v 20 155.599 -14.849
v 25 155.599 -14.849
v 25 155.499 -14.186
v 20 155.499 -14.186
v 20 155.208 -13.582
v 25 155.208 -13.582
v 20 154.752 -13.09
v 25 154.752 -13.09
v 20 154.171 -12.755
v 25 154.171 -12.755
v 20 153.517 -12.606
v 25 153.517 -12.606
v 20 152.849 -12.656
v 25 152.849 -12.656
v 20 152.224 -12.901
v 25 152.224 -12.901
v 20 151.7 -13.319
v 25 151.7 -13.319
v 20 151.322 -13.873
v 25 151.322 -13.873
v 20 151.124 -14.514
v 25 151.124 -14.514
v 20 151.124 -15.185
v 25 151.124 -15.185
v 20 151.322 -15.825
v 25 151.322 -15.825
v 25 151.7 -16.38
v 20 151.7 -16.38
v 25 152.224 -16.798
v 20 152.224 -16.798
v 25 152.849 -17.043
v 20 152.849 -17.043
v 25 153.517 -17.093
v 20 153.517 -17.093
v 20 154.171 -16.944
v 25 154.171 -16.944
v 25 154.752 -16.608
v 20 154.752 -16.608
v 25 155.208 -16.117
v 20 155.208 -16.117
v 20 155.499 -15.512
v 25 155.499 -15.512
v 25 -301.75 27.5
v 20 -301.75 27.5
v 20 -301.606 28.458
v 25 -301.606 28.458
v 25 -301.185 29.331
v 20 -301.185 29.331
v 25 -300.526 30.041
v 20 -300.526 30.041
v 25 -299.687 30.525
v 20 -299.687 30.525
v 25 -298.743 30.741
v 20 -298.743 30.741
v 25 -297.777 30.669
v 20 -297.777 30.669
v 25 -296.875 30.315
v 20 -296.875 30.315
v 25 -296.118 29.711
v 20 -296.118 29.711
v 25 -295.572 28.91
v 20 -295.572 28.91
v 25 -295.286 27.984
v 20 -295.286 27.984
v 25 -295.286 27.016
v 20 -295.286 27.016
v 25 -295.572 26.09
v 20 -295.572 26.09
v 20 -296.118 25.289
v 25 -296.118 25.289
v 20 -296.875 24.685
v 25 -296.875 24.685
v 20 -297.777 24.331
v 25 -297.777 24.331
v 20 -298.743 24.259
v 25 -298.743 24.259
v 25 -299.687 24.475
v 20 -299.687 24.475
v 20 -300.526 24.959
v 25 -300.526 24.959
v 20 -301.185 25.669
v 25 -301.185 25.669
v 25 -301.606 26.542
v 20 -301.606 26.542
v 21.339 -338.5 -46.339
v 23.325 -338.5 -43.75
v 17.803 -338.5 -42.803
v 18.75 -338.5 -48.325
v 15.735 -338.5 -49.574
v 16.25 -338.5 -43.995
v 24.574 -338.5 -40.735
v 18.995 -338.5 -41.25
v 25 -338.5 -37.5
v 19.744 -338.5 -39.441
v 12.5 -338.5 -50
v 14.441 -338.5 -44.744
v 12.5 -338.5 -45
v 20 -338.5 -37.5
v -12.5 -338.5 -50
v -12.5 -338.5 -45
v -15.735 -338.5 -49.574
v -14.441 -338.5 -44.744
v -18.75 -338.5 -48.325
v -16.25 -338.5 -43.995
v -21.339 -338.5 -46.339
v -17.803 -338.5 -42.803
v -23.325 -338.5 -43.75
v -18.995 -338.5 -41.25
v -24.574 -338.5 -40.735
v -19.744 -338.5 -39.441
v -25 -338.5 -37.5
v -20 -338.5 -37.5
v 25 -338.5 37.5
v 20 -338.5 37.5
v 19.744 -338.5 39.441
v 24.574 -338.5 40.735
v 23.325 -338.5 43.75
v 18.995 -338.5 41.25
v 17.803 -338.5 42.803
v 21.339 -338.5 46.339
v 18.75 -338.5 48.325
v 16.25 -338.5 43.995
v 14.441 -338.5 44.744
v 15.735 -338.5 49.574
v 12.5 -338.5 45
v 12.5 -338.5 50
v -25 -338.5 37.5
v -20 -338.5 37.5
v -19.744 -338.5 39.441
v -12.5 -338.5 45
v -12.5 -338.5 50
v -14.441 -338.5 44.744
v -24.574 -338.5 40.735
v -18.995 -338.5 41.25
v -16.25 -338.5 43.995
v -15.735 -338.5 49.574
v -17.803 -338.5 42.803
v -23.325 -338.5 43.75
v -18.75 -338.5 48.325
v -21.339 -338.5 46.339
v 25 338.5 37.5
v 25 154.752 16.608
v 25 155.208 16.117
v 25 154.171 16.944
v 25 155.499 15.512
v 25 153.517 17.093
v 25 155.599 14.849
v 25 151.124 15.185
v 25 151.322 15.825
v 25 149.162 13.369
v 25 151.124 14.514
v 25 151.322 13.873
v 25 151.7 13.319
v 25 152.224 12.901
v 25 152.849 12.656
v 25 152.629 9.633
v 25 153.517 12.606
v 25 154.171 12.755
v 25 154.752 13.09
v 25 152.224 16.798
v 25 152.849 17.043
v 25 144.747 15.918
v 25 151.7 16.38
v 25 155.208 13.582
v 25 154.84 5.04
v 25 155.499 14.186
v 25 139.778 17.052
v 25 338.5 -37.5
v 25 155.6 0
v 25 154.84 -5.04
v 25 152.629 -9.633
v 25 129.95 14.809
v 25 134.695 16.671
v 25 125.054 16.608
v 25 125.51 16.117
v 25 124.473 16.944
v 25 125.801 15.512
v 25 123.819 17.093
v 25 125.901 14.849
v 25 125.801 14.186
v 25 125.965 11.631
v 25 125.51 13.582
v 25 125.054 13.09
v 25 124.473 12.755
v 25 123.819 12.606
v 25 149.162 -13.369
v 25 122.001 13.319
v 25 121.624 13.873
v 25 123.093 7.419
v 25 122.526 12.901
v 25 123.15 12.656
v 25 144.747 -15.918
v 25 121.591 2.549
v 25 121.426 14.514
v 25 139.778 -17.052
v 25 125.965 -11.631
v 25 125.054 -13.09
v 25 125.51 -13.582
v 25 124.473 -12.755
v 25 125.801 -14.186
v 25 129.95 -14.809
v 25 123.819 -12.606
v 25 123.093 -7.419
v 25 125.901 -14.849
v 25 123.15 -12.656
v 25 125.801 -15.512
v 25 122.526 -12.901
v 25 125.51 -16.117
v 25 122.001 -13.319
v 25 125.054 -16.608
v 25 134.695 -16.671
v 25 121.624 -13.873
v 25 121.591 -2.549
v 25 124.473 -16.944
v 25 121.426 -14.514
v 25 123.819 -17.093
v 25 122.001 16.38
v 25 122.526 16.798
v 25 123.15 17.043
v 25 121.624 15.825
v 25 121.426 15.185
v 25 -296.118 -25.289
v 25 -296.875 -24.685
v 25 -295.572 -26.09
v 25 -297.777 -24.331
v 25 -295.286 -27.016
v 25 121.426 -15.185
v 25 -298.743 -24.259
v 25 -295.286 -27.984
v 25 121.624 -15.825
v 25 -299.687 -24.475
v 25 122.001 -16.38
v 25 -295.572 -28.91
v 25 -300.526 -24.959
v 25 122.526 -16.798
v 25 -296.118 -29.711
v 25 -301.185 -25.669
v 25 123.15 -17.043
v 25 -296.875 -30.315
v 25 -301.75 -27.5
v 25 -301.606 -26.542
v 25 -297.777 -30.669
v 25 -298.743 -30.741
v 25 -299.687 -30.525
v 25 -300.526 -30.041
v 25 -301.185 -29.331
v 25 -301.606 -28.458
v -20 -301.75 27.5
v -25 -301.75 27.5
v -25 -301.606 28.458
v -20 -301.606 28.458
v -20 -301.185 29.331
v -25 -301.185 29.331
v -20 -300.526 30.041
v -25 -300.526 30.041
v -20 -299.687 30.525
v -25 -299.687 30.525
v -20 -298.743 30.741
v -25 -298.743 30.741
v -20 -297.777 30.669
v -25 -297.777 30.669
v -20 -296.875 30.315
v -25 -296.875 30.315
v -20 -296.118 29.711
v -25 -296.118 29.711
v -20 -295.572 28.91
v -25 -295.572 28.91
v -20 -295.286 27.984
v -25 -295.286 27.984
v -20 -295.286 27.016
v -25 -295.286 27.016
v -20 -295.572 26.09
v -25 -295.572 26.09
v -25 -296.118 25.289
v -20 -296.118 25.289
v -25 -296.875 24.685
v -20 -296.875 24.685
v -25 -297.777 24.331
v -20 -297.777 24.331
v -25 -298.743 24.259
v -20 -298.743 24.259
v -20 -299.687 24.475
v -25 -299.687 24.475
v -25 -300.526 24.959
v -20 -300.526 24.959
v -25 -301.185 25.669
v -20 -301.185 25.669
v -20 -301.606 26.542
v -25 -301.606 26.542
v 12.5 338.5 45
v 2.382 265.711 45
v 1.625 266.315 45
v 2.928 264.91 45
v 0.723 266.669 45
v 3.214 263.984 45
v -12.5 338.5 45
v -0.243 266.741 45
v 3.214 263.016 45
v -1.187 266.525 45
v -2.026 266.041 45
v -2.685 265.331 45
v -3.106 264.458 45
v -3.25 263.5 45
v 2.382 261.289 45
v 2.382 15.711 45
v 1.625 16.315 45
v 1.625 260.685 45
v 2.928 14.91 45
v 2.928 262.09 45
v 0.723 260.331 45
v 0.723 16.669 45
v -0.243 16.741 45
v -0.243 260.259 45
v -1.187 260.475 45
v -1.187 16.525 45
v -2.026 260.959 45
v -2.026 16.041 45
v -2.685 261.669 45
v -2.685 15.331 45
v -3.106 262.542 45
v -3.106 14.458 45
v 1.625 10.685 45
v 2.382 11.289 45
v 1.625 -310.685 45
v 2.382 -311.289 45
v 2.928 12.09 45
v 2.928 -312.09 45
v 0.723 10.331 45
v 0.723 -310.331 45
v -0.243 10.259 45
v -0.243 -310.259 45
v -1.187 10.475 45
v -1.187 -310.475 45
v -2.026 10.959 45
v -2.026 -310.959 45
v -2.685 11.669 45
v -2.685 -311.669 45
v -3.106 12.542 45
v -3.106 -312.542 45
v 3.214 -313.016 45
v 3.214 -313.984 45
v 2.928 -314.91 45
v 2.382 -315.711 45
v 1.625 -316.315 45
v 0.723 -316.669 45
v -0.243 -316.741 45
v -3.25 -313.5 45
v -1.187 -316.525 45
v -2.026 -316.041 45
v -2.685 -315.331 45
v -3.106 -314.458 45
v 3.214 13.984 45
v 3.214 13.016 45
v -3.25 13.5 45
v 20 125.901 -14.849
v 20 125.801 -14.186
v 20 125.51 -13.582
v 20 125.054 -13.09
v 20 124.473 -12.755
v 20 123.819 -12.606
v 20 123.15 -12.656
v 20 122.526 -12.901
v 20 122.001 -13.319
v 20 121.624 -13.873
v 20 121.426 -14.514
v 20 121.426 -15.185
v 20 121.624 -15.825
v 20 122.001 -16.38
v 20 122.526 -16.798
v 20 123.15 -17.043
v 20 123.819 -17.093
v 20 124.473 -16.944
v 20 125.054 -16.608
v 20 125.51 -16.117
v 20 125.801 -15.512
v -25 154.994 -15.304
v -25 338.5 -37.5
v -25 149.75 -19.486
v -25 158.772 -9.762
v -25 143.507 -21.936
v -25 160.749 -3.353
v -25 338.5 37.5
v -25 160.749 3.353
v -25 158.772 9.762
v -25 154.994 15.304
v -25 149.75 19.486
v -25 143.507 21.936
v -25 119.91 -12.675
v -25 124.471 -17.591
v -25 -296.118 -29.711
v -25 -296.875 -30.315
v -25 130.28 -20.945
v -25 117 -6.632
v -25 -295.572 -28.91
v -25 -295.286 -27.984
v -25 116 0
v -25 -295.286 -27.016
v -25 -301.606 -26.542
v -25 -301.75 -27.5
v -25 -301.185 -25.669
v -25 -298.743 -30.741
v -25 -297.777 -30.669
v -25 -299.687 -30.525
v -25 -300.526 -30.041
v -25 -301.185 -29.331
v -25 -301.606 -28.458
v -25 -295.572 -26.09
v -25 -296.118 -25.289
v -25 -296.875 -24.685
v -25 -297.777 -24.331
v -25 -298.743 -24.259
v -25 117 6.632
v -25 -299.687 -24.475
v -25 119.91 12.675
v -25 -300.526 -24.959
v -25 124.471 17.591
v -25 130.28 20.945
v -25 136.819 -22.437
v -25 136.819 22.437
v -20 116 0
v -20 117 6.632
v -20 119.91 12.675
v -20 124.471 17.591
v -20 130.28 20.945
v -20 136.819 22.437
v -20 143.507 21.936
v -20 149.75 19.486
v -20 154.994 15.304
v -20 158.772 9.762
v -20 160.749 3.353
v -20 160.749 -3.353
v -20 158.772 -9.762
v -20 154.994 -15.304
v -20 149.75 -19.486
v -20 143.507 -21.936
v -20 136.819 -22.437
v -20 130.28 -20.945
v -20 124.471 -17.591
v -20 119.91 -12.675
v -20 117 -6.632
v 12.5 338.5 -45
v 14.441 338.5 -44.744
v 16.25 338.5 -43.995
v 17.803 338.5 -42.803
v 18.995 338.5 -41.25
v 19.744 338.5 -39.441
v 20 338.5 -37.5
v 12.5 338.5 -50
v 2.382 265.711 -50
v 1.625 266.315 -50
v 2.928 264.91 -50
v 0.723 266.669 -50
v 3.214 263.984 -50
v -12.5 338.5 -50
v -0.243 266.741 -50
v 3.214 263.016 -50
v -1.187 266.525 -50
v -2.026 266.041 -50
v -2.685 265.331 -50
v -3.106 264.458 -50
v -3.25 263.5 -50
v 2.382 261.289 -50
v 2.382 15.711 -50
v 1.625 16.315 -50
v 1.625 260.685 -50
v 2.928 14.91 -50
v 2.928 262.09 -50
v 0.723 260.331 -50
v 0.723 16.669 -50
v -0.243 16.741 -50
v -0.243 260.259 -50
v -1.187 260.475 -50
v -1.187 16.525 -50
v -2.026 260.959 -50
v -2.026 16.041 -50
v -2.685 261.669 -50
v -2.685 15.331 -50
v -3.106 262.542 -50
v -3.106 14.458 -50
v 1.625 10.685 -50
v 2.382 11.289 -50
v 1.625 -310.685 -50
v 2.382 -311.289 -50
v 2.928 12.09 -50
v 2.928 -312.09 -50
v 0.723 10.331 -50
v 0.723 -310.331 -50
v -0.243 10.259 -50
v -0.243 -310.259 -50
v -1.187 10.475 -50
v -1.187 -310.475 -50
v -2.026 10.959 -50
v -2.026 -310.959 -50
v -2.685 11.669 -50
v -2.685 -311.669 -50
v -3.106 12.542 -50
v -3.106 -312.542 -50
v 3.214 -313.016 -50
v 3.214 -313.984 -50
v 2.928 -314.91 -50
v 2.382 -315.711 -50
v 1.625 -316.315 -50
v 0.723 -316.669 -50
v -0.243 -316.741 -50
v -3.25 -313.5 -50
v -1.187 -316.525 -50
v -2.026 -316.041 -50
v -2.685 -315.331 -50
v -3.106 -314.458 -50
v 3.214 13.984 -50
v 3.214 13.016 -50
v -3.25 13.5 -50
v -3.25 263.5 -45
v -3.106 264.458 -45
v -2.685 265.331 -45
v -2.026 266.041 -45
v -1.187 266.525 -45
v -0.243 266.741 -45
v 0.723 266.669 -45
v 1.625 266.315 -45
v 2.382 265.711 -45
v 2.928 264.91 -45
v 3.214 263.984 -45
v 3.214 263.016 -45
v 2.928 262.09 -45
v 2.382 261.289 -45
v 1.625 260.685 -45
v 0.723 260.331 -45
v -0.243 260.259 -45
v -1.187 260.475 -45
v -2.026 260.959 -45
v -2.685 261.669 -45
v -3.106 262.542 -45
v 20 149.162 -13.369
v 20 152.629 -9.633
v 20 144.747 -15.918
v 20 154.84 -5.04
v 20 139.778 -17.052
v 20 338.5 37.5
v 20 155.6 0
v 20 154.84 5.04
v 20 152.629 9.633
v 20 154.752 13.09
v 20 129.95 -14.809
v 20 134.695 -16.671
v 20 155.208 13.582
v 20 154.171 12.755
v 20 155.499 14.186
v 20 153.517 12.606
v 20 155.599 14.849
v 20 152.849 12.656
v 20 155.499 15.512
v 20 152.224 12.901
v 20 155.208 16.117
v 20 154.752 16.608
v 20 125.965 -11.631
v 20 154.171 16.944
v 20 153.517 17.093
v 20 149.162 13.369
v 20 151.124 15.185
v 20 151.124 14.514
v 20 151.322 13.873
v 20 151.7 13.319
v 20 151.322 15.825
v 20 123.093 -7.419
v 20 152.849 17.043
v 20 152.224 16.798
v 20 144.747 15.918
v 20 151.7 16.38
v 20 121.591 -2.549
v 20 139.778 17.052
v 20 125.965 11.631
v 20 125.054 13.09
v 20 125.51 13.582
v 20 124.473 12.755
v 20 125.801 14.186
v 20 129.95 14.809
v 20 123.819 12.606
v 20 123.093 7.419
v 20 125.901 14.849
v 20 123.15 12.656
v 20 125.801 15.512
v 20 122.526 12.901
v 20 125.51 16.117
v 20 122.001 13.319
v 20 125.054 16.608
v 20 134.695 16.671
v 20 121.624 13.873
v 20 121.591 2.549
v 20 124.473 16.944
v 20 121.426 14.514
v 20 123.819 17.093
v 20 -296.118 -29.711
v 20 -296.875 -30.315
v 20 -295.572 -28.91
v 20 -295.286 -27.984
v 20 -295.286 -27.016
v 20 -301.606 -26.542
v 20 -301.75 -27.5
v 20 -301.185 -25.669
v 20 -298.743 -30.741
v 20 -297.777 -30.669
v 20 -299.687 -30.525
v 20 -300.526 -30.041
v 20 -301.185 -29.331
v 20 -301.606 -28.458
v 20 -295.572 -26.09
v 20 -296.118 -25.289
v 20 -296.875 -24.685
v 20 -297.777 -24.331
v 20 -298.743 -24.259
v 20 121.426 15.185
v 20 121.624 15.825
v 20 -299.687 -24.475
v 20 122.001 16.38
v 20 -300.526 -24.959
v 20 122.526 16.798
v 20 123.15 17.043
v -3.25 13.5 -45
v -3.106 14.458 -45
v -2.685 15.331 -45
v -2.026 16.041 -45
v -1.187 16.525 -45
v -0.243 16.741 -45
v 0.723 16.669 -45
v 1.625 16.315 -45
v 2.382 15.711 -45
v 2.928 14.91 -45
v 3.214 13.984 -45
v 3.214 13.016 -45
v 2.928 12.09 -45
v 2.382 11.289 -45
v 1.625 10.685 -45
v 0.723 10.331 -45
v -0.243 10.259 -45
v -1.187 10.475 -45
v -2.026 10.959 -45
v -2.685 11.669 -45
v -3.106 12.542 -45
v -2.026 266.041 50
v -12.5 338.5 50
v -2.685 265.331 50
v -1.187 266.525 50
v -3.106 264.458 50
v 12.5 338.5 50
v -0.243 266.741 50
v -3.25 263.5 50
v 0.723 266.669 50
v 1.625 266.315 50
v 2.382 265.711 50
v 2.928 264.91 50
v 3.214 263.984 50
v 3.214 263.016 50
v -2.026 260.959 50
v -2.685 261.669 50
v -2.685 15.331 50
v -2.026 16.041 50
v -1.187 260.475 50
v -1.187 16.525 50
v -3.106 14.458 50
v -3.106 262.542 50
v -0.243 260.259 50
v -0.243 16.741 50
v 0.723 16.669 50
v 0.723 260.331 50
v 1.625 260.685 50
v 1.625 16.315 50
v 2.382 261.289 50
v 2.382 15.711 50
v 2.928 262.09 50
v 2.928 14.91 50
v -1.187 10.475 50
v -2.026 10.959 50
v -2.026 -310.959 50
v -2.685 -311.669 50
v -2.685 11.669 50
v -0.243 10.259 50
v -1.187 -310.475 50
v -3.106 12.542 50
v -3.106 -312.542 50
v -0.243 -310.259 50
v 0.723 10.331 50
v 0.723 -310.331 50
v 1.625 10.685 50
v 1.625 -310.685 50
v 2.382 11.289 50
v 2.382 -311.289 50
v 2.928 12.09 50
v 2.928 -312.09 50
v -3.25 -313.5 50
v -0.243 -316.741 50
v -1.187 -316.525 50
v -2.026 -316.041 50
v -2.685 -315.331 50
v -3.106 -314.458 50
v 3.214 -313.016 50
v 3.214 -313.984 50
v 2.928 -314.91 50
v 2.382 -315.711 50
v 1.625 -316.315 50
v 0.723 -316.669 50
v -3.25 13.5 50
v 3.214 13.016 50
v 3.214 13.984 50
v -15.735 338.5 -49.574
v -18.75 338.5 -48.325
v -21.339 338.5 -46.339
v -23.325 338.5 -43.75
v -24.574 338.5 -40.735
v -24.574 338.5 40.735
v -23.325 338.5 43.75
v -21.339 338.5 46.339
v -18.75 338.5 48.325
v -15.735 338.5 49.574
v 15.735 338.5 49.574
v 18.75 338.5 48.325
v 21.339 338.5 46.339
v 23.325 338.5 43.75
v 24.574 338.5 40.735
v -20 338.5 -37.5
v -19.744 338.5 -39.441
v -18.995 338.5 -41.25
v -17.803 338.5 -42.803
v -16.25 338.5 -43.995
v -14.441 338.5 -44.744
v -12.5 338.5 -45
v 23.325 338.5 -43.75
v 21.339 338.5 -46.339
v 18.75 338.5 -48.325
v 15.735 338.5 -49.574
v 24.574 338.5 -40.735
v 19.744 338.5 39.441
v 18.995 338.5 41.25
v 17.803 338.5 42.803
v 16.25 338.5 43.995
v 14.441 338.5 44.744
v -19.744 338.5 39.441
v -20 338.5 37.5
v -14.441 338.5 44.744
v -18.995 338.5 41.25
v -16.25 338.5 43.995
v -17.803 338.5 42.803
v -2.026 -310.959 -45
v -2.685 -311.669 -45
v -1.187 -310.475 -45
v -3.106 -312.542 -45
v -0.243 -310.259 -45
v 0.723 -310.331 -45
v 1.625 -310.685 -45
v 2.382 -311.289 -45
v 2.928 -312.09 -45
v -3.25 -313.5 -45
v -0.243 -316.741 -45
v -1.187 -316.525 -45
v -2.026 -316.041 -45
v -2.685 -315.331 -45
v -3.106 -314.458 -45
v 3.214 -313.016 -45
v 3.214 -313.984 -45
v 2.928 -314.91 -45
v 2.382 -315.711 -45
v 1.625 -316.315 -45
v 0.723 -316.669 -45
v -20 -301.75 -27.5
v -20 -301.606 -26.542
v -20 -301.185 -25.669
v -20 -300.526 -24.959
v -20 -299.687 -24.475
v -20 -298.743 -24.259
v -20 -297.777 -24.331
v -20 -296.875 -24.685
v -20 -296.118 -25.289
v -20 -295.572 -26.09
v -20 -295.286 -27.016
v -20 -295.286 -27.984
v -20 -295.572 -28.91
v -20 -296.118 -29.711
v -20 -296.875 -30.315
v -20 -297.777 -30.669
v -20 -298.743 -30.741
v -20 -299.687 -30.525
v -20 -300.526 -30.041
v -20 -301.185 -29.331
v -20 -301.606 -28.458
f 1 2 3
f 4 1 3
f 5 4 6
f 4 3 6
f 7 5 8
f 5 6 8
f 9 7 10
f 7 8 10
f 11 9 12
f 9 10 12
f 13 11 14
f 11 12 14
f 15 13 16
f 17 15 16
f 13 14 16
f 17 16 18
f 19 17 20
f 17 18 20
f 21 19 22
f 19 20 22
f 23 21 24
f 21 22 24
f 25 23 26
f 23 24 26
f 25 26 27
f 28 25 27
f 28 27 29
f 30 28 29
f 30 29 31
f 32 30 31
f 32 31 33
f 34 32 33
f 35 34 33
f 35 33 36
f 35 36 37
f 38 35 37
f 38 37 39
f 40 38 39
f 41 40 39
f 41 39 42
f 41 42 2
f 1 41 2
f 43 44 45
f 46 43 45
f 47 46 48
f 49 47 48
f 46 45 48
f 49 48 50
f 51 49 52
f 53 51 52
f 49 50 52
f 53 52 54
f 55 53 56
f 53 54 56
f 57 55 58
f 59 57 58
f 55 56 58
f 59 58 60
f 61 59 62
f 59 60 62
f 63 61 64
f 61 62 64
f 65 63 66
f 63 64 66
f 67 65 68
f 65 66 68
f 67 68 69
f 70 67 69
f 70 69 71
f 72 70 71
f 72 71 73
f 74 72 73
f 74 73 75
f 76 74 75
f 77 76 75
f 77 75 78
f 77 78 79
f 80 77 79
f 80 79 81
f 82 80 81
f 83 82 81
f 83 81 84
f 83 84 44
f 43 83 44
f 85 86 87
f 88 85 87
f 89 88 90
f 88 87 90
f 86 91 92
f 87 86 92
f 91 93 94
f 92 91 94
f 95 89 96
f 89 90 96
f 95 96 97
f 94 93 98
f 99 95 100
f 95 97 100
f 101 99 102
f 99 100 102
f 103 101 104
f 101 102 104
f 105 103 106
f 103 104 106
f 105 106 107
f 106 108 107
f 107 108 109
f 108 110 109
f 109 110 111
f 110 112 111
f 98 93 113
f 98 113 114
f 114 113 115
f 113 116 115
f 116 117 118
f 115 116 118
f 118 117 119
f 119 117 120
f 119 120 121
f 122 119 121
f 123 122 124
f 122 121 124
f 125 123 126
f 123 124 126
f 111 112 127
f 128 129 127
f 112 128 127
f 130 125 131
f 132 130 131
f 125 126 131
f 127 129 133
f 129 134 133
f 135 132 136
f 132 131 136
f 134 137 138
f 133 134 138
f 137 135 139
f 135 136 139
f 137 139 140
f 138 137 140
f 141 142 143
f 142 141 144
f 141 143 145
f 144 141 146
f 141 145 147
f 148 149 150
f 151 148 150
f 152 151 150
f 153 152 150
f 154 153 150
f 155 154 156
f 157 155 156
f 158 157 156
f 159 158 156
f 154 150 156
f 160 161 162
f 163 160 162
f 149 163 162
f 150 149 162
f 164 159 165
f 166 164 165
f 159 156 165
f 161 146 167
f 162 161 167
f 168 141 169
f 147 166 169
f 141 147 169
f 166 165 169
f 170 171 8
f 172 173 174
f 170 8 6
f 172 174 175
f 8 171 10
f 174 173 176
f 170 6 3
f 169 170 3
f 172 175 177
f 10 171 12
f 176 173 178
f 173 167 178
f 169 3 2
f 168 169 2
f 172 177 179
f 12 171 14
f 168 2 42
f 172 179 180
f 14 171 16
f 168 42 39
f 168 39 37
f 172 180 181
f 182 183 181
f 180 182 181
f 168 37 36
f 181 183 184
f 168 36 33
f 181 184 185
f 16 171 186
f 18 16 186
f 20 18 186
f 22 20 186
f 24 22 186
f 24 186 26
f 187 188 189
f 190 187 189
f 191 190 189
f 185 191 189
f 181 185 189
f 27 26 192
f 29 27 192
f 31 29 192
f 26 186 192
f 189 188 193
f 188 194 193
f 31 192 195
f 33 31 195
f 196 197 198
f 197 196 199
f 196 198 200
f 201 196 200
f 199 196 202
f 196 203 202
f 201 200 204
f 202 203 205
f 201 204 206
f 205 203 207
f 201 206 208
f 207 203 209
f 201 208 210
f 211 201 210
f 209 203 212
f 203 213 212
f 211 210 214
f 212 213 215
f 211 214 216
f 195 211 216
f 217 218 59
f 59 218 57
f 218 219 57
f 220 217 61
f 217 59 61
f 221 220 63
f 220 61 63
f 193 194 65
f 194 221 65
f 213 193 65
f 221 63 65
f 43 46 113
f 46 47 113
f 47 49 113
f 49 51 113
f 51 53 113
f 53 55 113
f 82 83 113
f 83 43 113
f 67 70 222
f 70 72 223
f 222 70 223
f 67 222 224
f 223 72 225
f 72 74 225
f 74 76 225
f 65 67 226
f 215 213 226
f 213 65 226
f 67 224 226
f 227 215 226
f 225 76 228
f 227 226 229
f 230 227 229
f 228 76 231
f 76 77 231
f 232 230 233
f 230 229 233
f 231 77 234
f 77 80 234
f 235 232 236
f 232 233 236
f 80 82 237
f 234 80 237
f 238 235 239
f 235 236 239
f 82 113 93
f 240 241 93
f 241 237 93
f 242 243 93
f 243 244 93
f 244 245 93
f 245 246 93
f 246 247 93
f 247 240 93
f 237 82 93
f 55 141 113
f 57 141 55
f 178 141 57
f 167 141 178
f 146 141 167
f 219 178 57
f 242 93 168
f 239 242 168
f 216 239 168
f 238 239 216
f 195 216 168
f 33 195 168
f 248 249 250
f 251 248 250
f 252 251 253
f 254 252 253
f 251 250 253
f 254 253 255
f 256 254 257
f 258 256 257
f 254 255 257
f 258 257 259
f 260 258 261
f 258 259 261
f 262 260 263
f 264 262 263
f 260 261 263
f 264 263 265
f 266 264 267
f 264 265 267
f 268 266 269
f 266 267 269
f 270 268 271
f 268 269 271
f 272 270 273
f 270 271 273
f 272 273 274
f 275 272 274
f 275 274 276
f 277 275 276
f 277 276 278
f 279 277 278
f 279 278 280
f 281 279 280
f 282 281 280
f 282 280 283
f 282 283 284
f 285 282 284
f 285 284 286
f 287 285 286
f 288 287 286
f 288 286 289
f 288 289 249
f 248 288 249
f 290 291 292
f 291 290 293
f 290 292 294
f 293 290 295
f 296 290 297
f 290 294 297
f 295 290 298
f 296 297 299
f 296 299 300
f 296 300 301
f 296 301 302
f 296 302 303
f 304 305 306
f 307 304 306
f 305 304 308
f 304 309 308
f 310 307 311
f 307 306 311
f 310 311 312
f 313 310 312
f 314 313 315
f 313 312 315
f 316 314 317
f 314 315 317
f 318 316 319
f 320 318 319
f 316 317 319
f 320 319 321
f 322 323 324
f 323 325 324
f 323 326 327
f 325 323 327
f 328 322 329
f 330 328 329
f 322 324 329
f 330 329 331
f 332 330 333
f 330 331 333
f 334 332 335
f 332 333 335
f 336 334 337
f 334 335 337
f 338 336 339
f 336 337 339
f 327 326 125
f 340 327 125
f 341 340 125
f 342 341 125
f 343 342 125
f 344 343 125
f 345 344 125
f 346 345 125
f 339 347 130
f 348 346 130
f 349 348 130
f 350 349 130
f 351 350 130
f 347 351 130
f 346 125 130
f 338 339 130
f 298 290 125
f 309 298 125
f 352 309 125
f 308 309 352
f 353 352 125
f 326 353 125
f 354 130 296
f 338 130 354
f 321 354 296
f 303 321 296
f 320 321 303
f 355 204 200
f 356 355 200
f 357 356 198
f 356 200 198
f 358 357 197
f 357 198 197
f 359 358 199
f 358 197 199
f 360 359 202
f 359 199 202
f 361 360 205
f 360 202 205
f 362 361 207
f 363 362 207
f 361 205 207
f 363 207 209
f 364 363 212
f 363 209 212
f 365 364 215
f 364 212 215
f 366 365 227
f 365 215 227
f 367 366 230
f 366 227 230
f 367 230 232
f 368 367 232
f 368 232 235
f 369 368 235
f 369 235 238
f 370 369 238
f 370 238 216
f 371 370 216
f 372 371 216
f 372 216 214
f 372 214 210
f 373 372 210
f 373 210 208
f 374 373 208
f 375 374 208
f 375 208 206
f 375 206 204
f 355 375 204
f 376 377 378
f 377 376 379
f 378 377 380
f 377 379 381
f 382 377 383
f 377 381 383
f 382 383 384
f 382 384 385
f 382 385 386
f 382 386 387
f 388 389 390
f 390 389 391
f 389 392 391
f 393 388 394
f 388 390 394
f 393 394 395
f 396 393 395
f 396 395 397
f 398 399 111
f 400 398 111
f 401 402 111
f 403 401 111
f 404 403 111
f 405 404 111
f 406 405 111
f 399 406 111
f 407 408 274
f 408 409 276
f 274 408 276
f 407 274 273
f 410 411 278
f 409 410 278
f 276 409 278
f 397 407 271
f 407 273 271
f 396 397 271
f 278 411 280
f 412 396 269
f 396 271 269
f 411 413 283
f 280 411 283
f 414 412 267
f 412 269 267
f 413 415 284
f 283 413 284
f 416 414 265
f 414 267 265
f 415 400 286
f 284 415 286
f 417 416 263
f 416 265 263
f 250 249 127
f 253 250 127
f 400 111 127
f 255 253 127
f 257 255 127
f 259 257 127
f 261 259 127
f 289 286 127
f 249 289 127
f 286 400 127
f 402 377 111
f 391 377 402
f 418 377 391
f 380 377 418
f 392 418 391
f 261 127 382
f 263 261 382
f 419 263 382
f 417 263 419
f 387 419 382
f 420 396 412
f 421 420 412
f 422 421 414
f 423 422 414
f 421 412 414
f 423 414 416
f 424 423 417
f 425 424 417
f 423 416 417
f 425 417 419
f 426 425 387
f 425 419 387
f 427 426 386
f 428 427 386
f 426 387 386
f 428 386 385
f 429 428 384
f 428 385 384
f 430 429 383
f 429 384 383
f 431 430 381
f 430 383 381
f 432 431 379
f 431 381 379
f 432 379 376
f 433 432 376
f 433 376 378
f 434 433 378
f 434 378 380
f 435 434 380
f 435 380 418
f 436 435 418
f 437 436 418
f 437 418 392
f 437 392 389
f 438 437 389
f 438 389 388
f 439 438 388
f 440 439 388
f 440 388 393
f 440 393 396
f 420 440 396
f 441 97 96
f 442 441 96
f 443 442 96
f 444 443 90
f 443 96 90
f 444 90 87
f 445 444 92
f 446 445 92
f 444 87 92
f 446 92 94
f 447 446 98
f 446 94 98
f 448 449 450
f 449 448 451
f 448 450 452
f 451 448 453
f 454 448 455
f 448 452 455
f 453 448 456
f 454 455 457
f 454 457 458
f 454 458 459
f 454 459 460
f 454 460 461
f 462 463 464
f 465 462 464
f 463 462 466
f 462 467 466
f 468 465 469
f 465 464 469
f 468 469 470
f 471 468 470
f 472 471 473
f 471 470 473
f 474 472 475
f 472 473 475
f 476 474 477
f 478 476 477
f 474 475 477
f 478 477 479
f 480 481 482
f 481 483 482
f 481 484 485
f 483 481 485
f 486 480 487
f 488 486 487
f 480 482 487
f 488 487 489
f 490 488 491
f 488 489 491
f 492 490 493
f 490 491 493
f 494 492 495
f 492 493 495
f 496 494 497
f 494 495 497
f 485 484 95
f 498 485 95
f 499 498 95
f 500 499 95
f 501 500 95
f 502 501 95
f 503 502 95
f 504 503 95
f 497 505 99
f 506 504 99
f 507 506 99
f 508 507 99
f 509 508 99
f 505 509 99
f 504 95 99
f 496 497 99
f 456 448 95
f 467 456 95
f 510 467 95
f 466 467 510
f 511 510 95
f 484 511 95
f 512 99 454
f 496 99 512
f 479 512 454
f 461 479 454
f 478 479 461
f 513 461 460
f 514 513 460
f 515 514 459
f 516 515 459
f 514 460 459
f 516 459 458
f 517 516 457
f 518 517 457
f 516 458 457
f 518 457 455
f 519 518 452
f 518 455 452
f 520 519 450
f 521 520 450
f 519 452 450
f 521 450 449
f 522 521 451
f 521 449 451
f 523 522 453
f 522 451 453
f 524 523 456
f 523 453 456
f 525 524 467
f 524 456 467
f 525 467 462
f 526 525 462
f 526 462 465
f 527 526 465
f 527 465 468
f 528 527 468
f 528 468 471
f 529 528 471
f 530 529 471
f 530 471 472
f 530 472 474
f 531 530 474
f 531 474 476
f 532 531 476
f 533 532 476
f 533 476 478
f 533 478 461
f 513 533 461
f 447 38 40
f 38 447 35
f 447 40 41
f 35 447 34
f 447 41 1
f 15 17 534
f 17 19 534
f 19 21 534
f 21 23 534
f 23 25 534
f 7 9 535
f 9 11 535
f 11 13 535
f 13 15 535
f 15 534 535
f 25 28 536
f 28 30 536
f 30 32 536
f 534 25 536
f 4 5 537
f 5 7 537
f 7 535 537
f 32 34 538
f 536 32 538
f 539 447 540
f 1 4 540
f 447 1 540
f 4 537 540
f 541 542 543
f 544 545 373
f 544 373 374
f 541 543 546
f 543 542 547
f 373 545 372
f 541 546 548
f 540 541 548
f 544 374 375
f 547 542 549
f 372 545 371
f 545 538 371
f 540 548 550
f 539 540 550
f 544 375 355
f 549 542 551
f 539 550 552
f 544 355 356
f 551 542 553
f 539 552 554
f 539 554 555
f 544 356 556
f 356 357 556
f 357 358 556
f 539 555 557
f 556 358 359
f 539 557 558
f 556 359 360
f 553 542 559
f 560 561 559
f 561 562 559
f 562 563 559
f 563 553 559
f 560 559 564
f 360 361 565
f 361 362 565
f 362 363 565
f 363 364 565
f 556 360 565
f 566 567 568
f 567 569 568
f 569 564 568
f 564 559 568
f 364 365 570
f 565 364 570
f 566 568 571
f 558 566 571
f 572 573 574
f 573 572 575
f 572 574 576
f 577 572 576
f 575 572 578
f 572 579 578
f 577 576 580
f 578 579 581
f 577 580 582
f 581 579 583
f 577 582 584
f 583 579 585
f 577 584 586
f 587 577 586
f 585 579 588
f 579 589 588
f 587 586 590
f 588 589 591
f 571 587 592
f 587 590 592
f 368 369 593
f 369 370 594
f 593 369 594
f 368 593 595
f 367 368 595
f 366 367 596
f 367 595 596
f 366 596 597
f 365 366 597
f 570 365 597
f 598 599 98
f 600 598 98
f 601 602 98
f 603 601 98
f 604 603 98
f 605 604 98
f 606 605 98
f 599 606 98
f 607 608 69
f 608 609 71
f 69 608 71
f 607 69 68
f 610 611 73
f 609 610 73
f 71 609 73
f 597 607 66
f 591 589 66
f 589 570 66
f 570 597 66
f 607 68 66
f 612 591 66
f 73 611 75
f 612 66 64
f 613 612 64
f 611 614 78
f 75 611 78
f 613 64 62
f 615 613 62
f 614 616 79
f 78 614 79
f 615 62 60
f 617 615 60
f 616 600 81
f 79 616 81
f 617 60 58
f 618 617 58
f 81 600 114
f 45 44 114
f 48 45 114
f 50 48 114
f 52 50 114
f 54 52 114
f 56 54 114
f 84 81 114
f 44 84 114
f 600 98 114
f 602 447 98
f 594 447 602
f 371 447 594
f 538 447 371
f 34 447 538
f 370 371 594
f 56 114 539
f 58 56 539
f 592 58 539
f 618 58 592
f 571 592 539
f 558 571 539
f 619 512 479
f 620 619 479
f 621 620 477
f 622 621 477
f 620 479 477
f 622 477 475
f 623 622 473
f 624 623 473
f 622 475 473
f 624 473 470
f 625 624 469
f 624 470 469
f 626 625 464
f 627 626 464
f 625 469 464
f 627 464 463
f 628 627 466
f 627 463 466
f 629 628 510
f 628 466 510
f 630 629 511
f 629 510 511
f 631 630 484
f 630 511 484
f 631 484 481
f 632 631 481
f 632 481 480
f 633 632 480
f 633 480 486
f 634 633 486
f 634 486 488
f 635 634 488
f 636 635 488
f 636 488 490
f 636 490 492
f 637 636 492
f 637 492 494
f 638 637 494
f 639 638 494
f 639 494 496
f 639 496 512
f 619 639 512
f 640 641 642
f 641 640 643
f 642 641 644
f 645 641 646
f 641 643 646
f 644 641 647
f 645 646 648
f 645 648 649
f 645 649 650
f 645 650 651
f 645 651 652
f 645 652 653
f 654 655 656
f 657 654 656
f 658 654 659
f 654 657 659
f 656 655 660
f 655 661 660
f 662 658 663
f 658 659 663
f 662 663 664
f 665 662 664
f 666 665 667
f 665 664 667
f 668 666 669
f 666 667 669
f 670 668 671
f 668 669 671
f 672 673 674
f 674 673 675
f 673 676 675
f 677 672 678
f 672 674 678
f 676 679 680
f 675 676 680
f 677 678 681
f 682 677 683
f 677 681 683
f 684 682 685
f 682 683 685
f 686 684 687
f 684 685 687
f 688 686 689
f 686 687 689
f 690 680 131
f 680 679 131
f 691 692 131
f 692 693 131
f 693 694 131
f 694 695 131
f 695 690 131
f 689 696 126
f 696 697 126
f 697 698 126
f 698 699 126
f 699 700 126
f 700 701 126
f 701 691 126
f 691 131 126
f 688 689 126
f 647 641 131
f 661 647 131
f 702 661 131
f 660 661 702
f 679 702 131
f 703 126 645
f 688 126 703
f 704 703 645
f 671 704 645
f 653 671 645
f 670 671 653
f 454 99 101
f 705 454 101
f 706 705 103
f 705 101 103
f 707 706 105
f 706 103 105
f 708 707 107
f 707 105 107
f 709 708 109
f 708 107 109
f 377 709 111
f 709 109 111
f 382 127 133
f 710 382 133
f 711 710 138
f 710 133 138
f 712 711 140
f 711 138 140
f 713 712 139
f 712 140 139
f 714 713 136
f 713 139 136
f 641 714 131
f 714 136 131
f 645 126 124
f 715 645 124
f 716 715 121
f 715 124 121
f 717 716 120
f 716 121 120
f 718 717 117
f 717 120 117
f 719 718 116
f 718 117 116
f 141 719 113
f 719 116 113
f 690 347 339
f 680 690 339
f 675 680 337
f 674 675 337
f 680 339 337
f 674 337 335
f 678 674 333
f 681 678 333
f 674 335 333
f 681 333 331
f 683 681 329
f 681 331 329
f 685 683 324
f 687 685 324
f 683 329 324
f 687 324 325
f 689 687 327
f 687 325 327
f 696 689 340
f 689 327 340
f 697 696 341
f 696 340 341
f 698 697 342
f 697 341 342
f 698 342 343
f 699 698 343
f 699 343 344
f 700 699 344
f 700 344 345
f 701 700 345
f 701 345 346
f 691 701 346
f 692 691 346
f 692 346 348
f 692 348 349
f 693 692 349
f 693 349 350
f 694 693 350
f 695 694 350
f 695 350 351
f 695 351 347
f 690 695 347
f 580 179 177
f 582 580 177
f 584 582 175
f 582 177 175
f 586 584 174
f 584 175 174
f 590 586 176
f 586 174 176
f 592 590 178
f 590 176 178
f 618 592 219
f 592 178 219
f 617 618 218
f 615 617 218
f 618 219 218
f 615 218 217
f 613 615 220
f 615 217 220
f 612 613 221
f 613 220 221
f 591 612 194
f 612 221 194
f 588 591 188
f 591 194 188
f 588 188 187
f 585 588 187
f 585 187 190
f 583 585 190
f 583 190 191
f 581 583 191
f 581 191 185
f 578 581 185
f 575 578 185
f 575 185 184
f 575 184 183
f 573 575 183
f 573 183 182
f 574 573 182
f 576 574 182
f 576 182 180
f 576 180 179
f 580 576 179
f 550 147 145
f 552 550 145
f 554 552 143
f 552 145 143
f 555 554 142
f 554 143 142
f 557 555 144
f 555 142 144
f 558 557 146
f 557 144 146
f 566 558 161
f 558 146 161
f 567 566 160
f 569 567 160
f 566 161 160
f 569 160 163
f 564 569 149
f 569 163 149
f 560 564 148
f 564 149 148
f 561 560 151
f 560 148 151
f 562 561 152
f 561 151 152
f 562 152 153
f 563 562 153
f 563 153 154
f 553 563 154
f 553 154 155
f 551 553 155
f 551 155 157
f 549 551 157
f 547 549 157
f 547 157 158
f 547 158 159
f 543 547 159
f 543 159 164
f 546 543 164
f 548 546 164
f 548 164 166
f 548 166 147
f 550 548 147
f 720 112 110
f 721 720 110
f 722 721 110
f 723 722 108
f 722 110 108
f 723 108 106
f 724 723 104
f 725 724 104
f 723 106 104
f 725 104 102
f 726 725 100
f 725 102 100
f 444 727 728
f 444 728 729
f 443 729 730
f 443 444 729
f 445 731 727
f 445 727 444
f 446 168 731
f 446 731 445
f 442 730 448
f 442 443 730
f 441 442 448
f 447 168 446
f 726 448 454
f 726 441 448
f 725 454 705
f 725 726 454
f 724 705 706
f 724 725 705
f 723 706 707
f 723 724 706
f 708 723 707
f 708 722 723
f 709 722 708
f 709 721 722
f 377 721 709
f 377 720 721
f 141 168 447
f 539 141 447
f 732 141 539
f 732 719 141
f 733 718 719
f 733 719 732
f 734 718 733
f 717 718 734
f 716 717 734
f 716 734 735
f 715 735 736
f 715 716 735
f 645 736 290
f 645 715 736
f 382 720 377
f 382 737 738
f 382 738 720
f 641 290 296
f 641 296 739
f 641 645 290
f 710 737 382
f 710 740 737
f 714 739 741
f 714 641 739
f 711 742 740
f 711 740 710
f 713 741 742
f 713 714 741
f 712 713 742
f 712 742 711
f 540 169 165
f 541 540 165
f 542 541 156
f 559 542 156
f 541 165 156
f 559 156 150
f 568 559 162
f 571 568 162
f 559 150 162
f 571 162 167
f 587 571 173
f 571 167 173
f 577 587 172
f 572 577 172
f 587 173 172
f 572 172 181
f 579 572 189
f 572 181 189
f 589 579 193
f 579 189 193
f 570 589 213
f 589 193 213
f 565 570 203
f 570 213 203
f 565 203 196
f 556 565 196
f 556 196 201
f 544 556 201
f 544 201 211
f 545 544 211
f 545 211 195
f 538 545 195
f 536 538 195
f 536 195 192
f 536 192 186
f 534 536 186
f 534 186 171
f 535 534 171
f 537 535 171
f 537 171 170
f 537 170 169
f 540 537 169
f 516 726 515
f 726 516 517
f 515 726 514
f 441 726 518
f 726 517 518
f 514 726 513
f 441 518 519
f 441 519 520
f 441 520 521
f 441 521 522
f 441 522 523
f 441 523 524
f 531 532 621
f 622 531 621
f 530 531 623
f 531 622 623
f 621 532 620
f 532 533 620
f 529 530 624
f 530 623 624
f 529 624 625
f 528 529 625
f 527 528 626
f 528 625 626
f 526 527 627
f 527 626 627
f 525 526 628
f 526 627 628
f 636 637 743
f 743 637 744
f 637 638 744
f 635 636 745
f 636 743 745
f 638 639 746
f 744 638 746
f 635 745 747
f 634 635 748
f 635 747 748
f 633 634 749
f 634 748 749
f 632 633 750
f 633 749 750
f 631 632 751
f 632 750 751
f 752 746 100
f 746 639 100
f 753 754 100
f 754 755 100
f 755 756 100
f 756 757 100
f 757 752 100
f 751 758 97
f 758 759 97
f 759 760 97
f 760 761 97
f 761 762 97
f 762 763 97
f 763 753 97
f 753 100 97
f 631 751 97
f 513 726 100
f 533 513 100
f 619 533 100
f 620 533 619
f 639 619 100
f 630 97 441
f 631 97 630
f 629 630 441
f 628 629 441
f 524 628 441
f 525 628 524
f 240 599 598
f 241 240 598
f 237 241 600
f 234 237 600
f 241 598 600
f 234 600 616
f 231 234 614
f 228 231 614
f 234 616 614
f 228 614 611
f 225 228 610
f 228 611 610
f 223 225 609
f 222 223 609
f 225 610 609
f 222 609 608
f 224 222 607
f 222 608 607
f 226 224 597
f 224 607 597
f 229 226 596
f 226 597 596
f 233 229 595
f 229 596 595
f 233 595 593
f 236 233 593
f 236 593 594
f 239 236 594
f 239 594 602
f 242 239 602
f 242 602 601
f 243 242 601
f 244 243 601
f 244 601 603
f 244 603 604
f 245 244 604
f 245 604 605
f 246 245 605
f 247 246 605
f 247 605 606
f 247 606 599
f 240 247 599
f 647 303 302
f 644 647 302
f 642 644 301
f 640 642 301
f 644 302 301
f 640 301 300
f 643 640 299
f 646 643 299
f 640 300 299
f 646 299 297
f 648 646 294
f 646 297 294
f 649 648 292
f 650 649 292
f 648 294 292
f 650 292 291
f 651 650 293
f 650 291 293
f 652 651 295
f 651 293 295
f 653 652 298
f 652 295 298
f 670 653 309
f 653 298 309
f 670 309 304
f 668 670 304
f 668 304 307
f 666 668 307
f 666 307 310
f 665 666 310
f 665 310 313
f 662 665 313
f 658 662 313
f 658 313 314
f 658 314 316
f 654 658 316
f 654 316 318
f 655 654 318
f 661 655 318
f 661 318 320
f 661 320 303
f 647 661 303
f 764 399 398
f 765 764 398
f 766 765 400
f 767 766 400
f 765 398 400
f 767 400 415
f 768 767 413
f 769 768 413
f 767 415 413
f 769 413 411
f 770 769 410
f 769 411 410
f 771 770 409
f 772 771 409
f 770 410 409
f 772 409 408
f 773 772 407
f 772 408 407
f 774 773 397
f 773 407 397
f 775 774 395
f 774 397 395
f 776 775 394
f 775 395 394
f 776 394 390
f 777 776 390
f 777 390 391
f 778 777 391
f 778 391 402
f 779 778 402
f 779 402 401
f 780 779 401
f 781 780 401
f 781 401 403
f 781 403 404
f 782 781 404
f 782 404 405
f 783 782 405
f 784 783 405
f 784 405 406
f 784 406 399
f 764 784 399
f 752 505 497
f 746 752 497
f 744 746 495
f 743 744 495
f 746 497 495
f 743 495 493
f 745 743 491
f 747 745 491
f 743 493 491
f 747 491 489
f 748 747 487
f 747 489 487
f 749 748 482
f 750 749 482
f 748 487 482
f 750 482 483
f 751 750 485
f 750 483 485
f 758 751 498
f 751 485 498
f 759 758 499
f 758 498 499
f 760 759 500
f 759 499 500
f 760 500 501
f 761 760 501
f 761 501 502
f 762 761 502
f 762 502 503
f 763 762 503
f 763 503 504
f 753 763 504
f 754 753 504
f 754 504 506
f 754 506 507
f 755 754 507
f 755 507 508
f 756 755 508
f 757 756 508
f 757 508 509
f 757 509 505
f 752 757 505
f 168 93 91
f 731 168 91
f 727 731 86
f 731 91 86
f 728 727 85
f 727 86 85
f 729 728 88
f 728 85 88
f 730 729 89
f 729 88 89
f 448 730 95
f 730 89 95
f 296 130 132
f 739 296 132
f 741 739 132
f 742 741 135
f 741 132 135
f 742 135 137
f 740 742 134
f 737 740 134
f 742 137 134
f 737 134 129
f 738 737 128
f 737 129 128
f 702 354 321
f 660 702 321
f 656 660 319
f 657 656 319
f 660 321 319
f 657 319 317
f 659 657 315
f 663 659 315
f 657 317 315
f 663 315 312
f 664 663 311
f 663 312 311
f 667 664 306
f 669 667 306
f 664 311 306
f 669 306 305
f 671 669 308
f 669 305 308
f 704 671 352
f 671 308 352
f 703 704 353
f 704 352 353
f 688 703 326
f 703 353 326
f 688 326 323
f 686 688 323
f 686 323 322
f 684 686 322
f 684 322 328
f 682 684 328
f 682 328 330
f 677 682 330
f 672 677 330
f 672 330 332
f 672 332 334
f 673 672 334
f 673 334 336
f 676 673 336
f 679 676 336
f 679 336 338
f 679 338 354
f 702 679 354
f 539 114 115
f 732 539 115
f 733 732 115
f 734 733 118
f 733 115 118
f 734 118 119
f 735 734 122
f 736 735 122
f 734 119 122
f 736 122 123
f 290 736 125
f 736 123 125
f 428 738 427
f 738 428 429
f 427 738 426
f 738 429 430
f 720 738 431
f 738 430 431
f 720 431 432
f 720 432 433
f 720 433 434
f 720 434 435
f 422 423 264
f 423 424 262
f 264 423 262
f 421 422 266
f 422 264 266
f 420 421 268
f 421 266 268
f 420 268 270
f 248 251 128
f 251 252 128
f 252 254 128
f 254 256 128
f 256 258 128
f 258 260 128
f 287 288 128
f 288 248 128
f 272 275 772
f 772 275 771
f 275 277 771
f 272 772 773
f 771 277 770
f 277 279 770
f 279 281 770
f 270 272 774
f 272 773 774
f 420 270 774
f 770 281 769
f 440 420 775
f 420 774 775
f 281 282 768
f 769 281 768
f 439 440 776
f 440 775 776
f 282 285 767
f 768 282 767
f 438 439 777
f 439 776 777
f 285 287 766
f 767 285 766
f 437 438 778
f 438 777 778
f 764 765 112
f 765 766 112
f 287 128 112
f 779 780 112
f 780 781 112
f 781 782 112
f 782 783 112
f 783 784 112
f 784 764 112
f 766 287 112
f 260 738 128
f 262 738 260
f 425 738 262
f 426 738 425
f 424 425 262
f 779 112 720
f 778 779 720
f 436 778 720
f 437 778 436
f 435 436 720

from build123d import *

# Parameters (mm, degrees)
RHS_C350_AS_100X50X5_0_RHS_C350_1_DEPTH = 677
SKETCH18_R                              = 3.25
CUT_EXTRUDE1_DEPTH                      = 354.846364966
SKETCH19_R                              = 17.1
CUT_EXTRUDE2_DEPTH                      = 10
SKETCH20_R                              = 22.5
CUT_EXTRUDE3_DEPTH                      = 10
SKETCH12_R                              = 2.25
CUT_EXTRUDE4_DEPTH                      = 10
SKETCH21_R                              = 3.25
CUT_EXTRUDE5_DEPTH                      = 346.806665638
SKETCH22_R                              = 3.25
CUT_EXTRUDE6_DEPTH                      = 354.846364966


with BuildPart() as part:
    # Sketch11 → Rhs c350 as 100X50X5.0 RHS C350(1) (new body)
    with BuildSketch(Plane(origin=(0, -338.5, 0), x_dir=(-1, 0, 0), z_dir=(0, 1, 0))):
        with BuildLine():
            Line((-12.5, -50), (12.5, -50))
            ThreePointArc((12.5, -50), (21.338834765, -46.338834765), (25, -37.5))
            Line((25, -37.5), (25, 37.5))
            ThreePointArc((25, 37.5), (21.338834765, 46.338834765), (12.5, 50))
            Line((12.5, 50), (-12.5, 50))
            ThreePointArc((-12.5, 50), (-21.338834765, 46.338834765), (-25, 37.5))
            Line((-25, 37.5), (-25, -37.5))
            ThreePointArc((-25, -37.5), (-21.338834765, -46.338834765), (-12.5, -50))
        make_face()
        with BuildLine():
            Line((-12.5, 45), (12.5, 45))
            ThreePointArc((12.5, 45), (17.803300859, 42.803300859), (20, 37.5))
            Line((20, 37.5), (20, -37.5))
            ThreePointArc((20, -37.5), (17.803300859, -42.803300859), (12.5, -45))
            Line((12.5, -45), (-12.5, -45))
            ThreePointArc((-12.5, -45), (-17.803300859, -42.803300859), (-20, -37.5))
            Line((-20, -37.5), (-20, 37.5))
            ThreePointArc((-20, 37.5), (-17.803300859, 42.803300859), (-12.5, 45))
        make_face(mode=Mode.SUBTRACT)
    extrude(amount=RHS_C350_AS_100X50X5_0_RHS_C350_1_DEPTH)

    # Sketch18 → Cut-Extrude1 (cut, through all)
    with BuildSketch(Plane(origin=(0, 0, -50), x_dir=(-1, 0, 0), z_dir=(0, 0, -1))):
        with Locations((0, 263.5)):
            Circle(SKETCH18_R)
        with Locations((0, 13.5)):
            Circle(SKETCH18_R)
    extrude(amount=-CUT_EXTRUDE1_DEPTH, mode=Mode.SUBTRACT)

    # Sketch19 → Cut-Extrude2 (cut)
    with BuildSketch(Plane(origin=(25, 0, 0), x_dir=(0, 0, -1), z_dir=(1, 0, 0))):
        with Locations(Location((0, 138.5, 0), (0, 0, 90))):
            Circle(SKETCH19_R)
    extrude(amount=-CUT_EXTRUDE2_DEPTH, mode=Mode.SUBTRACT)

    # Sketch20 → Cut-Extrude3 (cut)
    with BuildSketch(Plane.ZY.offset(25)):
        with Locations(Location((0, 138.5, 0), (0, 0, 270))):
            Circle(SKETCH20_R)
    extrude(amount=-CUT_EXTRUDE3_DEPTH, mode=Mode.SUBTRACT)

    # Sketch12 → Cut-Extrude4 (cut)
    with BuildSketch(Plane(origin=(25, 0, 0), x_dir=(0, 0, -1), z_dir=(1, 0, 0))):
        with Locations(Location((14.849242405, 153.349242405, 0), (0, 0, 90))):
            Circle(SKETCH12_R)
        with Locations(Location((-14.849242405, 153.349242405, 0), (0, 0, 90))):
            Circle(SKETCH12_R)
        with Locations(Location((-14.849242405, 123.650757595, 0), (0, 0, 90))):
            Circle(SKETCH12_R)
        with Locations(Location((14.849242405, 123.650757595, 0), (0, 0, 90))):
            Circle(SKETCH12_R)
    extrude(amount=-CUT_EXTRUDE4_DEPTH, mode=Mode.SUBTRACT)

    # Sketch21 → Cut-Extrude5 (cut, through all)
    with BuildSketch(Plane.ZY.offset(25)):
        with Locations(Location((-27.5, -298.5, 0), (0, 0, 270))):
            Circle(SKETCH21_R)
        with Locations(Location((27.5, -298.5, 0), (0, 0, 270))):
            Circle(SKETCH21_R)
    extrude(amount=-CUT_EXTRUDE5_DEPTH, mode=Mode.SUBTRACT)

    # Sketch22 → Cut-Extrude6 (cut, through all)
    with BuildSketch(Plane(origin=(0, 0, -50), x_dir=(-1, 0, 0), z_dir=(0, 0, -1))):
        with Locations((0, -313.5)):
            Circle(SKETCH22_R)
    extrude(amount=-CUT_EXTRUDE6_DEPTH, mode=Mode.SUBTRACT)


solid = part.part
